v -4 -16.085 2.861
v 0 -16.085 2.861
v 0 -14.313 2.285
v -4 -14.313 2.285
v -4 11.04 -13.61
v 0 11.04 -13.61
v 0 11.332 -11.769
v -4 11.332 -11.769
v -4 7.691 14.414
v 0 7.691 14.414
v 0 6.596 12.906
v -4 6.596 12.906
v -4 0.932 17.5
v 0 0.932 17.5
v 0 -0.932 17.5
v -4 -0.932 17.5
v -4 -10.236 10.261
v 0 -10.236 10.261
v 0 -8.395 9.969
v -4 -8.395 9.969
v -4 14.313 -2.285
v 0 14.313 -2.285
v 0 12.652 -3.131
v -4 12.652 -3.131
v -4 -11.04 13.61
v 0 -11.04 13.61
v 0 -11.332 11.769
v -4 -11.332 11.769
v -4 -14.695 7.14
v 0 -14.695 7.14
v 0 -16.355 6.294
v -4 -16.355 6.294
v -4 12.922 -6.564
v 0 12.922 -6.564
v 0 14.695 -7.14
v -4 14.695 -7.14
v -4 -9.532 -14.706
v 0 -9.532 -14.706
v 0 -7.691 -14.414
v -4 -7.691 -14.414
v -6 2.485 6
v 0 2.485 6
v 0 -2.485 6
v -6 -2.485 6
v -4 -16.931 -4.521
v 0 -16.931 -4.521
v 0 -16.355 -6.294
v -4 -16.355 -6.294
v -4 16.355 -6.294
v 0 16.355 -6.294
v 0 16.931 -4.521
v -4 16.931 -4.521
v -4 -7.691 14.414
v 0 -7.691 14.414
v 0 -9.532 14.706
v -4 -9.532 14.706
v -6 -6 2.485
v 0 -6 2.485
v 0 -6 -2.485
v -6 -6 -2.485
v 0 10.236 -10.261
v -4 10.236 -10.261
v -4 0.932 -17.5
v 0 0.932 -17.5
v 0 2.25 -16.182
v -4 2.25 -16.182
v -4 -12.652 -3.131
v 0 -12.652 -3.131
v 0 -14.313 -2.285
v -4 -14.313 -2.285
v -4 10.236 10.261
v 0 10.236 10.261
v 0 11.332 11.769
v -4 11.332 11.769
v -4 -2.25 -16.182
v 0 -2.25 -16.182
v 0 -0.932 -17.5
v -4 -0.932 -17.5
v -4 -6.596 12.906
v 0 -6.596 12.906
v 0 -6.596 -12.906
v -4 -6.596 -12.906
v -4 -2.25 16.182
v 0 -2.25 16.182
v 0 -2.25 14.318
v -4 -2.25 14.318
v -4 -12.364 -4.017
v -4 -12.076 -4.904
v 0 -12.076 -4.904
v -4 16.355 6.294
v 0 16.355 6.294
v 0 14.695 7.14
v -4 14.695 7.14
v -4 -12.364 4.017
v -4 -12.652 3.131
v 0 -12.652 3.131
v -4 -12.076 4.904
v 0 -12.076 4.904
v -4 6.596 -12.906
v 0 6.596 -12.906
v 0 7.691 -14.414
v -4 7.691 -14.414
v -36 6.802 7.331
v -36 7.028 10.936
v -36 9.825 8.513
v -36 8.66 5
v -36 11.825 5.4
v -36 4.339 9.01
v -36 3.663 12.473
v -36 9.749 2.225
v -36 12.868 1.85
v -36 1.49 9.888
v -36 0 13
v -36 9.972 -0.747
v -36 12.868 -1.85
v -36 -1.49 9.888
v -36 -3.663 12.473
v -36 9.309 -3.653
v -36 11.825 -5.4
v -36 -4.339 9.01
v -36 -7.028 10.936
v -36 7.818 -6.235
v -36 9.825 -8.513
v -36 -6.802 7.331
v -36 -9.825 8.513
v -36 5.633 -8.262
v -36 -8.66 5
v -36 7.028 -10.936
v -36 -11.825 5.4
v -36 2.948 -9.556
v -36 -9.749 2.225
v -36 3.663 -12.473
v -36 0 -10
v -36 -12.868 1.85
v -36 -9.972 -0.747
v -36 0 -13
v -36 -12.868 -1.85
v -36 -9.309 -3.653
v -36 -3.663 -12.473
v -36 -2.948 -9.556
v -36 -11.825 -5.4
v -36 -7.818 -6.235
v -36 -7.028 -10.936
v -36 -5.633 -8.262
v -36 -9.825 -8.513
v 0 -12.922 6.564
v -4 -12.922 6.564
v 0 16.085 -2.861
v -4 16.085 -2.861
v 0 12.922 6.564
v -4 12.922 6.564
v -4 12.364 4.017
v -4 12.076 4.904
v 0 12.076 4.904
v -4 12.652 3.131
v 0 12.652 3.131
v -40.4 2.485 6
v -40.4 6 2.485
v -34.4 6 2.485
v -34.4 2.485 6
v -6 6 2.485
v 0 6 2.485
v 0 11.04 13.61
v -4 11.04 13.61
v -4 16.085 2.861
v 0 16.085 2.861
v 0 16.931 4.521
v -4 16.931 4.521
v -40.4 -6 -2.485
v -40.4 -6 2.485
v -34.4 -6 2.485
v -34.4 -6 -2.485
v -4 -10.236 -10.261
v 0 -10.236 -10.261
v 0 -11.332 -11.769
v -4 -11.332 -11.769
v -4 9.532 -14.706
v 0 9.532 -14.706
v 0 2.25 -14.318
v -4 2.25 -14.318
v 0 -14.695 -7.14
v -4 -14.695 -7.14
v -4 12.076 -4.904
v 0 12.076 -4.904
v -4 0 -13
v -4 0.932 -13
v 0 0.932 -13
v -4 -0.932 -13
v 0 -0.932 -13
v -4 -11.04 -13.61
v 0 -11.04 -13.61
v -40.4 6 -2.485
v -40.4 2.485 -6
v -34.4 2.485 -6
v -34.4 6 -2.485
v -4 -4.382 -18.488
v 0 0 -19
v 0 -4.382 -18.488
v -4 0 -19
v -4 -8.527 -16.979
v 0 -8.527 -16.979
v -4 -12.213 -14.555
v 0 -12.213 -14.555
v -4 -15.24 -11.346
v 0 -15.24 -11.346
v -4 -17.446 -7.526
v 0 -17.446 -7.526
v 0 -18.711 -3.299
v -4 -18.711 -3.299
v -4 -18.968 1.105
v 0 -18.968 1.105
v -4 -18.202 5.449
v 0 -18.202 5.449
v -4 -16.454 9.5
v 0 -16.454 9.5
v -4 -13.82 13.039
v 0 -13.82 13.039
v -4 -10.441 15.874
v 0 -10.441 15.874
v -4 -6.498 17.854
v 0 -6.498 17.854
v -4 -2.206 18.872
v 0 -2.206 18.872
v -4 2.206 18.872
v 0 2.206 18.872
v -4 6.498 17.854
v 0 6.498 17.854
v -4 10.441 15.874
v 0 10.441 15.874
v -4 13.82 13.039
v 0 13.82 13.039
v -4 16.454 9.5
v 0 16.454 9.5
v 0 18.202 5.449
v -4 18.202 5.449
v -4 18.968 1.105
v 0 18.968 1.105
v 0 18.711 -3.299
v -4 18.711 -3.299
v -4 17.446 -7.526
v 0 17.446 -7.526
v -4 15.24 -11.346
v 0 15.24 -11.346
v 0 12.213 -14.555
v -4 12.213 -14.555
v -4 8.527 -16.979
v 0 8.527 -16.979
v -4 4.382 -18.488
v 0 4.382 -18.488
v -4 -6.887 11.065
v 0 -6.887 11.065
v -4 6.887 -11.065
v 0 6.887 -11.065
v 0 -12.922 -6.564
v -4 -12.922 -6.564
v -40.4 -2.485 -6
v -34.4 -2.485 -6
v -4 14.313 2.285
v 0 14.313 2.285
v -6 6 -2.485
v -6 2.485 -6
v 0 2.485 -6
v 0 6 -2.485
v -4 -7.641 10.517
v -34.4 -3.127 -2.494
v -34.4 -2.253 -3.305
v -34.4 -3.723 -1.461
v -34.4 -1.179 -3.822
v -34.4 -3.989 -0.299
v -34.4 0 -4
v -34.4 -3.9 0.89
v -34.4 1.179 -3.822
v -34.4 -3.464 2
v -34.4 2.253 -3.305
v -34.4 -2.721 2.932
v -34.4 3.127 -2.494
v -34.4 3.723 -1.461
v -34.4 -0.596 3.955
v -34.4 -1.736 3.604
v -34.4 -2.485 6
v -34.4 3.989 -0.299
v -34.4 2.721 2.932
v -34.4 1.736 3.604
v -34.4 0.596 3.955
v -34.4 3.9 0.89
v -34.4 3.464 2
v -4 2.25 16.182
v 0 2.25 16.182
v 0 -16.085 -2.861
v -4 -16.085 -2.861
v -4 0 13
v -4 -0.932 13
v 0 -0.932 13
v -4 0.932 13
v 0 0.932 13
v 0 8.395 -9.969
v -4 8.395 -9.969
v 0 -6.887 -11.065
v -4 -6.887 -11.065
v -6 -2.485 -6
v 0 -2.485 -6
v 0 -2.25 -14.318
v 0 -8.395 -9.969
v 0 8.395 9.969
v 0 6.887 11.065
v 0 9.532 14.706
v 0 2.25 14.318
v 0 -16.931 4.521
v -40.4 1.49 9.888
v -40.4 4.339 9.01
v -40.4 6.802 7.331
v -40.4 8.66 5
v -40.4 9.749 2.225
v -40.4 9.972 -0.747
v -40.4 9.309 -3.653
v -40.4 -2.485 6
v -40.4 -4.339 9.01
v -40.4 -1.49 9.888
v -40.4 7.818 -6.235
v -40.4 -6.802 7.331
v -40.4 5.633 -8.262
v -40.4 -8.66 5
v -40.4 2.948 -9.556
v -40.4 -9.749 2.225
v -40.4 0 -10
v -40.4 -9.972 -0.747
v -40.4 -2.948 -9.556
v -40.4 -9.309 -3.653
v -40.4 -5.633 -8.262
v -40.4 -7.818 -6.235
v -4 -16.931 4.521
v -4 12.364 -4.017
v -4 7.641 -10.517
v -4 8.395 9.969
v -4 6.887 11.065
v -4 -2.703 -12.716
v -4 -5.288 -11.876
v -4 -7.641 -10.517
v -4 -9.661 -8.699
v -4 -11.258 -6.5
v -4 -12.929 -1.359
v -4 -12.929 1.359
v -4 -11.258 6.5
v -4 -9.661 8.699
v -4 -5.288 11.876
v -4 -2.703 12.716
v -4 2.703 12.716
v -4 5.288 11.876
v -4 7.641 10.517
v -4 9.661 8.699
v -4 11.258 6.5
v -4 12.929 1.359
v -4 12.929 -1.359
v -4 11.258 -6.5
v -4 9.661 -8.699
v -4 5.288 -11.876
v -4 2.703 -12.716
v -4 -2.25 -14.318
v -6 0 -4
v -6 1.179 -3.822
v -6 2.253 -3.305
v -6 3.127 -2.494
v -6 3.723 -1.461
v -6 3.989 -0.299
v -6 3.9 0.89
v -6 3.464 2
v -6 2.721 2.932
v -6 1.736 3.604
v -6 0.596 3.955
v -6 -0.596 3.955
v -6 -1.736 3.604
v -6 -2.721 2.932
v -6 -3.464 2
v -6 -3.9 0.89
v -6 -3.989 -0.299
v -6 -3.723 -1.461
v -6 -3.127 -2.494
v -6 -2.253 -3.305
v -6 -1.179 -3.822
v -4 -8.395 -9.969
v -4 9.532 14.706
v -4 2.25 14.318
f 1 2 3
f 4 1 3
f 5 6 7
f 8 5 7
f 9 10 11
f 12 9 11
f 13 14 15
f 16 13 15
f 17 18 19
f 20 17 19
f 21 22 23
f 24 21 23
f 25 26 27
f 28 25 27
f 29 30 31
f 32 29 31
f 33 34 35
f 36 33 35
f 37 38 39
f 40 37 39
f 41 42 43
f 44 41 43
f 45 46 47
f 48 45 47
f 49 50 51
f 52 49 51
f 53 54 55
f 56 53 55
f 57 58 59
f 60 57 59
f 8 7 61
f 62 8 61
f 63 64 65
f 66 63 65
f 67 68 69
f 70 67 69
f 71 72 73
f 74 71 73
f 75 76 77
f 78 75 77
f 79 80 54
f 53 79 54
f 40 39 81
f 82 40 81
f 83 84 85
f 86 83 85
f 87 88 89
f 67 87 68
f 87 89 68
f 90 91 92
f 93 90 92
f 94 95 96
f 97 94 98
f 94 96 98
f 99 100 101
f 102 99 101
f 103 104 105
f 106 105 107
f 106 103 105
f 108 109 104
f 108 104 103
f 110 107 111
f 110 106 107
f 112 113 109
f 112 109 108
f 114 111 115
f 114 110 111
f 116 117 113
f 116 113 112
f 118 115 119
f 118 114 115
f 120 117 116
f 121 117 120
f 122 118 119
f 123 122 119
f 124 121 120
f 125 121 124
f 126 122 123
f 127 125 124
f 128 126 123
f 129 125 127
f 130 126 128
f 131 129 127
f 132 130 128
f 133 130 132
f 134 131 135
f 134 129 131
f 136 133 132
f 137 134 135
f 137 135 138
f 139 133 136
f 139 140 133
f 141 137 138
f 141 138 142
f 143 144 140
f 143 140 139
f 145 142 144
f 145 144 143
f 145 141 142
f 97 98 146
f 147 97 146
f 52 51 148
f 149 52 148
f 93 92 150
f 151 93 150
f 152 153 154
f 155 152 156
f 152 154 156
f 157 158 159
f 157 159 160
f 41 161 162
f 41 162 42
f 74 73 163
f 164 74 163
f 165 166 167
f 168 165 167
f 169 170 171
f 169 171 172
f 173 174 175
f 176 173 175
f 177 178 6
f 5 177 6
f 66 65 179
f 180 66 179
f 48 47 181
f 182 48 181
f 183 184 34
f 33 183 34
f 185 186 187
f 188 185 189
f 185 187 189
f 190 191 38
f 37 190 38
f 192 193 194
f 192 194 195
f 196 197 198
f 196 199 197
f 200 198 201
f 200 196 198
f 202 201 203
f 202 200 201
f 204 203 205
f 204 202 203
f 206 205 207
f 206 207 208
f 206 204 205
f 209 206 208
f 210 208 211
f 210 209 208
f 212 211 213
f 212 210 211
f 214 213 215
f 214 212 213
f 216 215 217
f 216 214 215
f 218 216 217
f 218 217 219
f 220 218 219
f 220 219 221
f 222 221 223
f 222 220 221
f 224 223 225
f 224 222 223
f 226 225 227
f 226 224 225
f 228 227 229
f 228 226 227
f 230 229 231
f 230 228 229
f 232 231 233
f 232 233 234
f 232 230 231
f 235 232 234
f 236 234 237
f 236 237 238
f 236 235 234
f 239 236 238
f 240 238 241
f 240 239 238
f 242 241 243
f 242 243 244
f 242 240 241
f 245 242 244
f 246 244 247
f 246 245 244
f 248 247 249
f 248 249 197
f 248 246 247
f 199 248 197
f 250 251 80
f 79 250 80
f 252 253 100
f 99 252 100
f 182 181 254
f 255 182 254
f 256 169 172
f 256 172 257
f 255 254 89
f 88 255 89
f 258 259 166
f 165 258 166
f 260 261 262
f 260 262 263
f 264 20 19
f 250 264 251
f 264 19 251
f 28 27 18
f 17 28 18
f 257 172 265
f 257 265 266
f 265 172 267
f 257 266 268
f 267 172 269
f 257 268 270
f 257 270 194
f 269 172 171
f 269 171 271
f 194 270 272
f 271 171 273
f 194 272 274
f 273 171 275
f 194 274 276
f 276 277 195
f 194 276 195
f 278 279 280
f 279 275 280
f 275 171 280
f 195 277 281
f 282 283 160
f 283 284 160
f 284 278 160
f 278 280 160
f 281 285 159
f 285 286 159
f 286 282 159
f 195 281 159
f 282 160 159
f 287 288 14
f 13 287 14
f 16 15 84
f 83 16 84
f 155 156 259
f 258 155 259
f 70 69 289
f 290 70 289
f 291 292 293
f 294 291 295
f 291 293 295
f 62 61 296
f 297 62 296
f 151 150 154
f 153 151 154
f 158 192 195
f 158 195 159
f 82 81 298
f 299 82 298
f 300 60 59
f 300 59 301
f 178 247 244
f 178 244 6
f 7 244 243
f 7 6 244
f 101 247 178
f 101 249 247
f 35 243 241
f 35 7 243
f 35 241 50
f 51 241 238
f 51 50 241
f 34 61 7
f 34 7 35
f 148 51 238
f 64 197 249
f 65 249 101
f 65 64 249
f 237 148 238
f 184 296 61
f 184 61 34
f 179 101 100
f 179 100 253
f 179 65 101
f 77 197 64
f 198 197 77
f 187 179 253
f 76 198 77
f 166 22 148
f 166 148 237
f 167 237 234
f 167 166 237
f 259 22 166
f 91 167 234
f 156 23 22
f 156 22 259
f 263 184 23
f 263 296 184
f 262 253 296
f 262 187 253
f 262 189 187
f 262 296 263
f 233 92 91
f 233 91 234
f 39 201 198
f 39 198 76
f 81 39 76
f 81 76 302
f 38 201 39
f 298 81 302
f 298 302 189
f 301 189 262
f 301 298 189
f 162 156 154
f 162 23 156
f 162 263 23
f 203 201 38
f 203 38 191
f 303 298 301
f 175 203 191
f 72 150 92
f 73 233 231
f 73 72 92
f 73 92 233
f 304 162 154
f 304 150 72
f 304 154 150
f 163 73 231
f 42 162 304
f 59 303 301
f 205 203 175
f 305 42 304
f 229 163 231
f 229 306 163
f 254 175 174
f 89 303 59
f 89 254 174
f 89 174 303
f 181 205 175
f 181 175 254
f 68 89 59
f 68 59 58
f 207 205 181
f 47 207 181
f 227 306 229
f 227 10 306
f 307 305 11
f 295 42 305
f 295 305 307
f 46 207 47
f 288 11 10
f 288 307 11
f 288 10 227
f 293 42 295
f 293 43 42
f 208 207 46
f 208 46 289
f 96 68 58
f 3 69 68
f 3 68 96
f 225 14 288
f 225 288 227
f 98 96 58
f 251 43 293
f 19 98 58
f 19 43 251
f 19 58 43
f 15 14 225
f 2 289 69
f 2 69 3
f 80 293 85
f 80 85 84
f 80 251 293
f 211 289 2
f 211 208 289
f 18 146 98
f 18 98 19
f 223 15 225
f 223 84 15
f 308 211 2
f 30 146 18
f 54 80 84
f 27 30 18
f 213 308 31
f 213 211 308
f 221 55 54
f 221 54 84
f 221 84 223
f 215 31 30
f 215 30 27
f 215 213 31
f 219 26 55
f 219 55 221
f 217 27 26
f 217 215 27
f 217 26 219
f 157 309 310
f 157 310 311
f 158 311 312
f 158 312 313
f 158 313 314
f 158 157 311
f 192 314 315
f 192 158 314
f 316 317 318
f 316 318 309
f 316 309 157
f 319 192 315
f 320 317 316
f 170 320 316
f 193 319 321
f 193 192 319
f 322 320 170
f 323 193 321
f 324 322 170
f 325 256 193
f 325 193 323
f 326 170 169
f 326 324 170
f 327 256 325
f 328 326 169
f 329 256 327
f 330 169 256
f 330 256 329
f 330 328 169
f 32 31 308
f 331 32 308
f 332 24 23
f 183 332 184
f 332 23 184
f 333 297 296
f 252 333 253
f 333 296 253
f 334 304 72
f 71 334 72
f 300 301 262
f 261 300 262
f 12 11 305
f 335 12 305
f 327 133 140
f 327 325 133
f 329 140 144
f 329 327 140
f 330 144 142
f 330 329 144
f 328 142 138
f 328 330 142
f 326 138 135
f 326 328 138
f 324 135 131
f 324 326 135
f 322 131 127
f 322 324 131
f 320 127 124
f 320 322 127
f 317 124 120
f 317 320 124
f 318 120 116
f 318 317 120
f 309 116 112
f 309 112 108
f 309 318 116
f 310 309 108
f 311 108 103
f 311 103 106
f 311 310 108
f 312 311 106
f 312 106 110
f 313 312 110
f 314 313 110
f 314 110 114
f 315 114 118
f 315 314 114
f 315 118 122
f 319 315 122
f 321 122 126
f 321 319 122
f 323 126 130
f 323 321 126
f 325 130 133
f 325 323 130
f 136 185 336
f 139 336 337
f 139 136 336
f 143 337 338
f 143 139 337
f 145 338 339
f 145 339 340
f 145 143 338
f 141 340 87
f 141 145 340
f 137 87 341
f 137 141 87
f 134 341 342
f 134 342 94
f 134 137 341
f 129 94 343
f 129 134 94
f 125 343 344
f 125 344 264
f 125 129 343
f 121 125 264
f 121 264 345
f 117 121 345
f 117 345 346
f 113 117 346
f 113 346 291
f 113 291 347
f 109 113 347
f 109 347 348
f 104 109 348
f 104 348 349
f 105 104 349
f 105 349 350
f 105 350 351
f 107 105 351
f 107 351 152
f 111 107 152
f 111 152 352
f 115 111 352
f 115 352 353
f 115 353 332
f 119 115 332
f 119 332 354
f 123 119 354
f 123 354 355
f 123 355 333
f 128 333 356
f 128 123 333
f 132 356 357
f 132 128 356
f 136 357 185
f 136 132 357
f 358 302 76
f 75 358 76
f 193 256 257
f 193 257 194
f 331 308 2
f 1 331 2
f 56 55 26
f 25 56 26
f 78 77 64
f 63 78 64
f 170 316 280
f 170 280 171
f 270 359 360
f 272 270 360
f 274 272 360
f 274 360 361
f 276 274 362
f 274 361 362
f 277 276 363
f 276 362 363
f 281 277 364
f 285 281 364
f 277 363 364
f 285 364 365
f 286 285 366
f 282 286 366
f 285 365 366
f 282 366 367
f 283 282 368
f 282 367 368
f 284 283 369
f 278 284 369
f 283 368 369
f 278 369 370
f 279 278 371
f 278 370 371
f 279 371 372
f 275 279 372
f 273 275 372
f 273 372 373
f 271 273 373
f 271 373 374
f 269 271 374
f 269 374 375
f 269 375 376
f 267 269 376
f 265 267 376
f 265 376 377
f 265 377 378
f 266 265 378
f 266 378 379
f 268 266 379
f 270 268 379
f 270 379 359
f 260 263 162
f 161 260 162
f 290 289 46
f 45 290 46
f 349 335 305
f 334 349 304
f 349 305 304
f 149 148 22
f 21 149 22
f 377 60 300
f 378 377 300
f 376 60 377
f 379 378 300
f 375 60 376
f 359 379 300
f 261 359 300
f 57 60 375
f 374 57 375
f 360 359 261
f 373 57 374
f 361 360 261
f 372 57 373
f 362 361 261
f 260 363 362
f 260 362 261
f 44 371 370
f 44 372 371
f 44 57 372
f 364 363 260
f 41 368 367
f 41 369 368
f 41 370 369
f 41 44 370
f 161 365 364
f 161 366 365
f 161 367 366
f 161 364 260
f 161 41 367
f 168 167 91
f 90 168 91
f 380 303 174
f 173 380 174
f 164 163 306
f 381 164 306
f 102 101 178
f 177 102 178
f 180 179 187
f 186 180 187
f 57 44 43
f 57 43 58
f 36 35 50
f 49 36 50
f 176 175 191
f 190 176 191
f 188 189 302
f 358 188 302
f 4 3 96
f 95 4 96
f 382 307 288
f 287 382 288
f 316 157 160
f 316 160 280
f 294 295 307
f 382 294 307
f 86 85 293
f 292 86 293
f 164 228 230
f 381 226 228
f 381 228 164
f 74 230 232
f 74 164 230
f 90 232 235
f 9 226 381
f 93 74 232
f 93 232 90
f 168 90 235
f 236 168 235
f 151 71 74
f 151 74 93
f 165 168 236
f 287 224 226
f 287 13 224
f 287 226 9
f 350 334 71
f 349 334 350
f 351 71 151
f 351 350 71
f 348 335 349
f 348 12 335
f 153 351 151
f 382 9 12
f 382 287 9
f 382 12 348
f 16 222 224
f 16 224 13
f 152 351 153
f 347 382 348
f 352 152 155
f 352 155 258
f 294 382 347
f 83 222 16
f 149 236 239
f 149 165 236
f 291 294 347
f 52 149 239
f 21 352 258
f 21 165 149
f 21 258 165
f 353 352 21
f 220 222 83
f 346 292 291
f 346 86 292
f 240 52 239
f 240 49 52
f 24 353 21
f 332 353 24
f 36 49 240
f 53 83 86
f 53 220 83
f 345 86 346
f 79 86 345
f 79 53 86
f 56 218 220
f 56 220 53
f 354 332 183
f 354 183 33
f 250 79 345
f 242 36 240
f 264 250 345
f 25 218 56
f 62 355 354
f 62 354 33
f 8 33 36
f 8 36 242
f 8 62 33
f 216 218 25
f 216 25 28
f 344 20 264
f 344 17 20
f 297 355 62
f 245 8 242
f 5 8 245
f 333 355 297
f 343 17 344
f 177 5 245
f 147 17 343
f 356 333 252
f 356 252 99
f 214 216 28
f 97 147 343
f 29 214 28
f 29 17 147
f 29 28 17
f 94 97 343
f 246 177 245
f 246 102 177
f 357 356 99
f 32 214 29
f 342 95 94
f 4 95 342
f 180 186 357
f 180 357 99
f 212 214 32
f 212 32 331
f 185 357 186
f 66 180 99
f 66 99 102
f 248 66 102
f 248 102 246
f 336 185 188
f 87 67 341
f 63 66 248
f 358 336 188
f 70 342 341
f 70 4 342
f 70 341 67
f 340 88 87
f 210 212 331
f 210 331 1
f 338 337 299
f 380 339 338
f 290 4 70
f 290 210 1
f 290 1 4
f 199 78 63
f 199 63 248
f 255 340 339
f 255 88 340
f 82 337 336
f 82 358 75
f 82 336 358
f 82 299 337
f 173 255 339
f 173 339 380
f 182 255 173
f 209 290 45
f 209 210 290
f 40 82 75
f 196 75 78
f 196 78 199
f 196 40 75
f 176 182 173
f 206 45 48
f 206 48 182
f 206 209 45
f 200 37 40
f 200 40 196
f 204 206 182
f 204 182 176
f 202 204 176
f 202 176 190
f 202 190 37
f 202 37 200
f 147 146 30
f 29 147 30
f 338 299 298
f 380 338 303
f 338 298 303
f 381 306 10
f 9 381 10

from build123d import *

# Parameters (mm, degrees)
CORTAR_EXTRUIR1_DEPTH = 6
CORTAR_EXTRUIR2_DEPTH = 4
MATRIZC1_COUNT        = 10
CROQUIS4_R            = 4
CORTAR_EXTRUIR3_DEPTH = 44.650429551


with BuildPart() as part:
    # Croquis1 → Revolución1 (revolve)
    with BuildSketch(Plane(origin=(0, 0, 0), x_dir=(0, 1, 0), z_dir=(0, 0, 1)), mode=Mode.PRIVATE) as revoluci_n1_sk:
        Polygon((0, 0), (19, 0), (19, 4), (13, 4), (13, 36), (10, 36), (10, 40.4), (0, 40.4), align=None)
    revolve(revoluci_n1_sk.sketch.rotate(Axis((0, 0, 0), (-1, 0, 0)), 90), axis=Axis((0, 0, 0), (-1, 0, 0)))

    # Croquis2 → Cortar-Extruir1 (cut)
    with BuildSketch(Plane.YZ):
        Polygon((2.485281374, -6), (6, -2.485281374), (6, 2.485281374), (2.485281374, 6), (-2.485281374, 6), (-6, 2.485281374), (-6, -2.485281374), (-2.485281374, -6), align=None)
    cortar_extruir1 = extrude(amount=-CORTAR_EXTRUIR1_DEPTH, mode=Mode.SUBTRACT)

    # Simetría1: Cortar-Extruir1 across plane
    add(cortar_extruir1.mirror(Plane(origin=(-20.2, 0, 0), x_dir=(0, 0, 1), z_dir=(1, 0, 0))), mode=Mode.SUBTRACT)

    # Croquis3 → Cortar-Extruir2 (cut)
    with BuildSketch(Plane.YZ):
        Polygon((2.25, 14.318019485), (2.25, 16.181980515), (0.931980515, 17.5), (-0.931980515, 17.5), (-2.25, 16.181980515), (-2.25, 14.318019485), (-0.931980515, 13), (0.931980515, 13), align=None)
    cortar_extruir2 = extrude(amount=-CORTAR_EXTRUIR2_DEPTH, mode=Mode.SUBTRACT)

    # MatrizC1: Cortar-Extruir2 ×10 about axis
    matrizc1_axis = Axis((0, 0, 0), (1, 0, 0))
    for i in range(1, MATRIZC1_COUNT):
        add(cortar_extruir2.rotate(matrizc1_axis, i * 360 / MATRIZC1_COUNT), mode=Mode.SUBTRACT)

    # Croquis4 → Cortar-Extruir3 (cut, through all)
    with BuildSketch(Plane.YZ.offset(-6)):
        with Locations(Location((0, 0, 0), (0, 0, 270))):
            Circle(CROQUIS4_R)
    extrude(amount=-CORTAR_EXTRUIR3_DEPTH, mode=Mode.SUBTRACT)


solid = part.part
